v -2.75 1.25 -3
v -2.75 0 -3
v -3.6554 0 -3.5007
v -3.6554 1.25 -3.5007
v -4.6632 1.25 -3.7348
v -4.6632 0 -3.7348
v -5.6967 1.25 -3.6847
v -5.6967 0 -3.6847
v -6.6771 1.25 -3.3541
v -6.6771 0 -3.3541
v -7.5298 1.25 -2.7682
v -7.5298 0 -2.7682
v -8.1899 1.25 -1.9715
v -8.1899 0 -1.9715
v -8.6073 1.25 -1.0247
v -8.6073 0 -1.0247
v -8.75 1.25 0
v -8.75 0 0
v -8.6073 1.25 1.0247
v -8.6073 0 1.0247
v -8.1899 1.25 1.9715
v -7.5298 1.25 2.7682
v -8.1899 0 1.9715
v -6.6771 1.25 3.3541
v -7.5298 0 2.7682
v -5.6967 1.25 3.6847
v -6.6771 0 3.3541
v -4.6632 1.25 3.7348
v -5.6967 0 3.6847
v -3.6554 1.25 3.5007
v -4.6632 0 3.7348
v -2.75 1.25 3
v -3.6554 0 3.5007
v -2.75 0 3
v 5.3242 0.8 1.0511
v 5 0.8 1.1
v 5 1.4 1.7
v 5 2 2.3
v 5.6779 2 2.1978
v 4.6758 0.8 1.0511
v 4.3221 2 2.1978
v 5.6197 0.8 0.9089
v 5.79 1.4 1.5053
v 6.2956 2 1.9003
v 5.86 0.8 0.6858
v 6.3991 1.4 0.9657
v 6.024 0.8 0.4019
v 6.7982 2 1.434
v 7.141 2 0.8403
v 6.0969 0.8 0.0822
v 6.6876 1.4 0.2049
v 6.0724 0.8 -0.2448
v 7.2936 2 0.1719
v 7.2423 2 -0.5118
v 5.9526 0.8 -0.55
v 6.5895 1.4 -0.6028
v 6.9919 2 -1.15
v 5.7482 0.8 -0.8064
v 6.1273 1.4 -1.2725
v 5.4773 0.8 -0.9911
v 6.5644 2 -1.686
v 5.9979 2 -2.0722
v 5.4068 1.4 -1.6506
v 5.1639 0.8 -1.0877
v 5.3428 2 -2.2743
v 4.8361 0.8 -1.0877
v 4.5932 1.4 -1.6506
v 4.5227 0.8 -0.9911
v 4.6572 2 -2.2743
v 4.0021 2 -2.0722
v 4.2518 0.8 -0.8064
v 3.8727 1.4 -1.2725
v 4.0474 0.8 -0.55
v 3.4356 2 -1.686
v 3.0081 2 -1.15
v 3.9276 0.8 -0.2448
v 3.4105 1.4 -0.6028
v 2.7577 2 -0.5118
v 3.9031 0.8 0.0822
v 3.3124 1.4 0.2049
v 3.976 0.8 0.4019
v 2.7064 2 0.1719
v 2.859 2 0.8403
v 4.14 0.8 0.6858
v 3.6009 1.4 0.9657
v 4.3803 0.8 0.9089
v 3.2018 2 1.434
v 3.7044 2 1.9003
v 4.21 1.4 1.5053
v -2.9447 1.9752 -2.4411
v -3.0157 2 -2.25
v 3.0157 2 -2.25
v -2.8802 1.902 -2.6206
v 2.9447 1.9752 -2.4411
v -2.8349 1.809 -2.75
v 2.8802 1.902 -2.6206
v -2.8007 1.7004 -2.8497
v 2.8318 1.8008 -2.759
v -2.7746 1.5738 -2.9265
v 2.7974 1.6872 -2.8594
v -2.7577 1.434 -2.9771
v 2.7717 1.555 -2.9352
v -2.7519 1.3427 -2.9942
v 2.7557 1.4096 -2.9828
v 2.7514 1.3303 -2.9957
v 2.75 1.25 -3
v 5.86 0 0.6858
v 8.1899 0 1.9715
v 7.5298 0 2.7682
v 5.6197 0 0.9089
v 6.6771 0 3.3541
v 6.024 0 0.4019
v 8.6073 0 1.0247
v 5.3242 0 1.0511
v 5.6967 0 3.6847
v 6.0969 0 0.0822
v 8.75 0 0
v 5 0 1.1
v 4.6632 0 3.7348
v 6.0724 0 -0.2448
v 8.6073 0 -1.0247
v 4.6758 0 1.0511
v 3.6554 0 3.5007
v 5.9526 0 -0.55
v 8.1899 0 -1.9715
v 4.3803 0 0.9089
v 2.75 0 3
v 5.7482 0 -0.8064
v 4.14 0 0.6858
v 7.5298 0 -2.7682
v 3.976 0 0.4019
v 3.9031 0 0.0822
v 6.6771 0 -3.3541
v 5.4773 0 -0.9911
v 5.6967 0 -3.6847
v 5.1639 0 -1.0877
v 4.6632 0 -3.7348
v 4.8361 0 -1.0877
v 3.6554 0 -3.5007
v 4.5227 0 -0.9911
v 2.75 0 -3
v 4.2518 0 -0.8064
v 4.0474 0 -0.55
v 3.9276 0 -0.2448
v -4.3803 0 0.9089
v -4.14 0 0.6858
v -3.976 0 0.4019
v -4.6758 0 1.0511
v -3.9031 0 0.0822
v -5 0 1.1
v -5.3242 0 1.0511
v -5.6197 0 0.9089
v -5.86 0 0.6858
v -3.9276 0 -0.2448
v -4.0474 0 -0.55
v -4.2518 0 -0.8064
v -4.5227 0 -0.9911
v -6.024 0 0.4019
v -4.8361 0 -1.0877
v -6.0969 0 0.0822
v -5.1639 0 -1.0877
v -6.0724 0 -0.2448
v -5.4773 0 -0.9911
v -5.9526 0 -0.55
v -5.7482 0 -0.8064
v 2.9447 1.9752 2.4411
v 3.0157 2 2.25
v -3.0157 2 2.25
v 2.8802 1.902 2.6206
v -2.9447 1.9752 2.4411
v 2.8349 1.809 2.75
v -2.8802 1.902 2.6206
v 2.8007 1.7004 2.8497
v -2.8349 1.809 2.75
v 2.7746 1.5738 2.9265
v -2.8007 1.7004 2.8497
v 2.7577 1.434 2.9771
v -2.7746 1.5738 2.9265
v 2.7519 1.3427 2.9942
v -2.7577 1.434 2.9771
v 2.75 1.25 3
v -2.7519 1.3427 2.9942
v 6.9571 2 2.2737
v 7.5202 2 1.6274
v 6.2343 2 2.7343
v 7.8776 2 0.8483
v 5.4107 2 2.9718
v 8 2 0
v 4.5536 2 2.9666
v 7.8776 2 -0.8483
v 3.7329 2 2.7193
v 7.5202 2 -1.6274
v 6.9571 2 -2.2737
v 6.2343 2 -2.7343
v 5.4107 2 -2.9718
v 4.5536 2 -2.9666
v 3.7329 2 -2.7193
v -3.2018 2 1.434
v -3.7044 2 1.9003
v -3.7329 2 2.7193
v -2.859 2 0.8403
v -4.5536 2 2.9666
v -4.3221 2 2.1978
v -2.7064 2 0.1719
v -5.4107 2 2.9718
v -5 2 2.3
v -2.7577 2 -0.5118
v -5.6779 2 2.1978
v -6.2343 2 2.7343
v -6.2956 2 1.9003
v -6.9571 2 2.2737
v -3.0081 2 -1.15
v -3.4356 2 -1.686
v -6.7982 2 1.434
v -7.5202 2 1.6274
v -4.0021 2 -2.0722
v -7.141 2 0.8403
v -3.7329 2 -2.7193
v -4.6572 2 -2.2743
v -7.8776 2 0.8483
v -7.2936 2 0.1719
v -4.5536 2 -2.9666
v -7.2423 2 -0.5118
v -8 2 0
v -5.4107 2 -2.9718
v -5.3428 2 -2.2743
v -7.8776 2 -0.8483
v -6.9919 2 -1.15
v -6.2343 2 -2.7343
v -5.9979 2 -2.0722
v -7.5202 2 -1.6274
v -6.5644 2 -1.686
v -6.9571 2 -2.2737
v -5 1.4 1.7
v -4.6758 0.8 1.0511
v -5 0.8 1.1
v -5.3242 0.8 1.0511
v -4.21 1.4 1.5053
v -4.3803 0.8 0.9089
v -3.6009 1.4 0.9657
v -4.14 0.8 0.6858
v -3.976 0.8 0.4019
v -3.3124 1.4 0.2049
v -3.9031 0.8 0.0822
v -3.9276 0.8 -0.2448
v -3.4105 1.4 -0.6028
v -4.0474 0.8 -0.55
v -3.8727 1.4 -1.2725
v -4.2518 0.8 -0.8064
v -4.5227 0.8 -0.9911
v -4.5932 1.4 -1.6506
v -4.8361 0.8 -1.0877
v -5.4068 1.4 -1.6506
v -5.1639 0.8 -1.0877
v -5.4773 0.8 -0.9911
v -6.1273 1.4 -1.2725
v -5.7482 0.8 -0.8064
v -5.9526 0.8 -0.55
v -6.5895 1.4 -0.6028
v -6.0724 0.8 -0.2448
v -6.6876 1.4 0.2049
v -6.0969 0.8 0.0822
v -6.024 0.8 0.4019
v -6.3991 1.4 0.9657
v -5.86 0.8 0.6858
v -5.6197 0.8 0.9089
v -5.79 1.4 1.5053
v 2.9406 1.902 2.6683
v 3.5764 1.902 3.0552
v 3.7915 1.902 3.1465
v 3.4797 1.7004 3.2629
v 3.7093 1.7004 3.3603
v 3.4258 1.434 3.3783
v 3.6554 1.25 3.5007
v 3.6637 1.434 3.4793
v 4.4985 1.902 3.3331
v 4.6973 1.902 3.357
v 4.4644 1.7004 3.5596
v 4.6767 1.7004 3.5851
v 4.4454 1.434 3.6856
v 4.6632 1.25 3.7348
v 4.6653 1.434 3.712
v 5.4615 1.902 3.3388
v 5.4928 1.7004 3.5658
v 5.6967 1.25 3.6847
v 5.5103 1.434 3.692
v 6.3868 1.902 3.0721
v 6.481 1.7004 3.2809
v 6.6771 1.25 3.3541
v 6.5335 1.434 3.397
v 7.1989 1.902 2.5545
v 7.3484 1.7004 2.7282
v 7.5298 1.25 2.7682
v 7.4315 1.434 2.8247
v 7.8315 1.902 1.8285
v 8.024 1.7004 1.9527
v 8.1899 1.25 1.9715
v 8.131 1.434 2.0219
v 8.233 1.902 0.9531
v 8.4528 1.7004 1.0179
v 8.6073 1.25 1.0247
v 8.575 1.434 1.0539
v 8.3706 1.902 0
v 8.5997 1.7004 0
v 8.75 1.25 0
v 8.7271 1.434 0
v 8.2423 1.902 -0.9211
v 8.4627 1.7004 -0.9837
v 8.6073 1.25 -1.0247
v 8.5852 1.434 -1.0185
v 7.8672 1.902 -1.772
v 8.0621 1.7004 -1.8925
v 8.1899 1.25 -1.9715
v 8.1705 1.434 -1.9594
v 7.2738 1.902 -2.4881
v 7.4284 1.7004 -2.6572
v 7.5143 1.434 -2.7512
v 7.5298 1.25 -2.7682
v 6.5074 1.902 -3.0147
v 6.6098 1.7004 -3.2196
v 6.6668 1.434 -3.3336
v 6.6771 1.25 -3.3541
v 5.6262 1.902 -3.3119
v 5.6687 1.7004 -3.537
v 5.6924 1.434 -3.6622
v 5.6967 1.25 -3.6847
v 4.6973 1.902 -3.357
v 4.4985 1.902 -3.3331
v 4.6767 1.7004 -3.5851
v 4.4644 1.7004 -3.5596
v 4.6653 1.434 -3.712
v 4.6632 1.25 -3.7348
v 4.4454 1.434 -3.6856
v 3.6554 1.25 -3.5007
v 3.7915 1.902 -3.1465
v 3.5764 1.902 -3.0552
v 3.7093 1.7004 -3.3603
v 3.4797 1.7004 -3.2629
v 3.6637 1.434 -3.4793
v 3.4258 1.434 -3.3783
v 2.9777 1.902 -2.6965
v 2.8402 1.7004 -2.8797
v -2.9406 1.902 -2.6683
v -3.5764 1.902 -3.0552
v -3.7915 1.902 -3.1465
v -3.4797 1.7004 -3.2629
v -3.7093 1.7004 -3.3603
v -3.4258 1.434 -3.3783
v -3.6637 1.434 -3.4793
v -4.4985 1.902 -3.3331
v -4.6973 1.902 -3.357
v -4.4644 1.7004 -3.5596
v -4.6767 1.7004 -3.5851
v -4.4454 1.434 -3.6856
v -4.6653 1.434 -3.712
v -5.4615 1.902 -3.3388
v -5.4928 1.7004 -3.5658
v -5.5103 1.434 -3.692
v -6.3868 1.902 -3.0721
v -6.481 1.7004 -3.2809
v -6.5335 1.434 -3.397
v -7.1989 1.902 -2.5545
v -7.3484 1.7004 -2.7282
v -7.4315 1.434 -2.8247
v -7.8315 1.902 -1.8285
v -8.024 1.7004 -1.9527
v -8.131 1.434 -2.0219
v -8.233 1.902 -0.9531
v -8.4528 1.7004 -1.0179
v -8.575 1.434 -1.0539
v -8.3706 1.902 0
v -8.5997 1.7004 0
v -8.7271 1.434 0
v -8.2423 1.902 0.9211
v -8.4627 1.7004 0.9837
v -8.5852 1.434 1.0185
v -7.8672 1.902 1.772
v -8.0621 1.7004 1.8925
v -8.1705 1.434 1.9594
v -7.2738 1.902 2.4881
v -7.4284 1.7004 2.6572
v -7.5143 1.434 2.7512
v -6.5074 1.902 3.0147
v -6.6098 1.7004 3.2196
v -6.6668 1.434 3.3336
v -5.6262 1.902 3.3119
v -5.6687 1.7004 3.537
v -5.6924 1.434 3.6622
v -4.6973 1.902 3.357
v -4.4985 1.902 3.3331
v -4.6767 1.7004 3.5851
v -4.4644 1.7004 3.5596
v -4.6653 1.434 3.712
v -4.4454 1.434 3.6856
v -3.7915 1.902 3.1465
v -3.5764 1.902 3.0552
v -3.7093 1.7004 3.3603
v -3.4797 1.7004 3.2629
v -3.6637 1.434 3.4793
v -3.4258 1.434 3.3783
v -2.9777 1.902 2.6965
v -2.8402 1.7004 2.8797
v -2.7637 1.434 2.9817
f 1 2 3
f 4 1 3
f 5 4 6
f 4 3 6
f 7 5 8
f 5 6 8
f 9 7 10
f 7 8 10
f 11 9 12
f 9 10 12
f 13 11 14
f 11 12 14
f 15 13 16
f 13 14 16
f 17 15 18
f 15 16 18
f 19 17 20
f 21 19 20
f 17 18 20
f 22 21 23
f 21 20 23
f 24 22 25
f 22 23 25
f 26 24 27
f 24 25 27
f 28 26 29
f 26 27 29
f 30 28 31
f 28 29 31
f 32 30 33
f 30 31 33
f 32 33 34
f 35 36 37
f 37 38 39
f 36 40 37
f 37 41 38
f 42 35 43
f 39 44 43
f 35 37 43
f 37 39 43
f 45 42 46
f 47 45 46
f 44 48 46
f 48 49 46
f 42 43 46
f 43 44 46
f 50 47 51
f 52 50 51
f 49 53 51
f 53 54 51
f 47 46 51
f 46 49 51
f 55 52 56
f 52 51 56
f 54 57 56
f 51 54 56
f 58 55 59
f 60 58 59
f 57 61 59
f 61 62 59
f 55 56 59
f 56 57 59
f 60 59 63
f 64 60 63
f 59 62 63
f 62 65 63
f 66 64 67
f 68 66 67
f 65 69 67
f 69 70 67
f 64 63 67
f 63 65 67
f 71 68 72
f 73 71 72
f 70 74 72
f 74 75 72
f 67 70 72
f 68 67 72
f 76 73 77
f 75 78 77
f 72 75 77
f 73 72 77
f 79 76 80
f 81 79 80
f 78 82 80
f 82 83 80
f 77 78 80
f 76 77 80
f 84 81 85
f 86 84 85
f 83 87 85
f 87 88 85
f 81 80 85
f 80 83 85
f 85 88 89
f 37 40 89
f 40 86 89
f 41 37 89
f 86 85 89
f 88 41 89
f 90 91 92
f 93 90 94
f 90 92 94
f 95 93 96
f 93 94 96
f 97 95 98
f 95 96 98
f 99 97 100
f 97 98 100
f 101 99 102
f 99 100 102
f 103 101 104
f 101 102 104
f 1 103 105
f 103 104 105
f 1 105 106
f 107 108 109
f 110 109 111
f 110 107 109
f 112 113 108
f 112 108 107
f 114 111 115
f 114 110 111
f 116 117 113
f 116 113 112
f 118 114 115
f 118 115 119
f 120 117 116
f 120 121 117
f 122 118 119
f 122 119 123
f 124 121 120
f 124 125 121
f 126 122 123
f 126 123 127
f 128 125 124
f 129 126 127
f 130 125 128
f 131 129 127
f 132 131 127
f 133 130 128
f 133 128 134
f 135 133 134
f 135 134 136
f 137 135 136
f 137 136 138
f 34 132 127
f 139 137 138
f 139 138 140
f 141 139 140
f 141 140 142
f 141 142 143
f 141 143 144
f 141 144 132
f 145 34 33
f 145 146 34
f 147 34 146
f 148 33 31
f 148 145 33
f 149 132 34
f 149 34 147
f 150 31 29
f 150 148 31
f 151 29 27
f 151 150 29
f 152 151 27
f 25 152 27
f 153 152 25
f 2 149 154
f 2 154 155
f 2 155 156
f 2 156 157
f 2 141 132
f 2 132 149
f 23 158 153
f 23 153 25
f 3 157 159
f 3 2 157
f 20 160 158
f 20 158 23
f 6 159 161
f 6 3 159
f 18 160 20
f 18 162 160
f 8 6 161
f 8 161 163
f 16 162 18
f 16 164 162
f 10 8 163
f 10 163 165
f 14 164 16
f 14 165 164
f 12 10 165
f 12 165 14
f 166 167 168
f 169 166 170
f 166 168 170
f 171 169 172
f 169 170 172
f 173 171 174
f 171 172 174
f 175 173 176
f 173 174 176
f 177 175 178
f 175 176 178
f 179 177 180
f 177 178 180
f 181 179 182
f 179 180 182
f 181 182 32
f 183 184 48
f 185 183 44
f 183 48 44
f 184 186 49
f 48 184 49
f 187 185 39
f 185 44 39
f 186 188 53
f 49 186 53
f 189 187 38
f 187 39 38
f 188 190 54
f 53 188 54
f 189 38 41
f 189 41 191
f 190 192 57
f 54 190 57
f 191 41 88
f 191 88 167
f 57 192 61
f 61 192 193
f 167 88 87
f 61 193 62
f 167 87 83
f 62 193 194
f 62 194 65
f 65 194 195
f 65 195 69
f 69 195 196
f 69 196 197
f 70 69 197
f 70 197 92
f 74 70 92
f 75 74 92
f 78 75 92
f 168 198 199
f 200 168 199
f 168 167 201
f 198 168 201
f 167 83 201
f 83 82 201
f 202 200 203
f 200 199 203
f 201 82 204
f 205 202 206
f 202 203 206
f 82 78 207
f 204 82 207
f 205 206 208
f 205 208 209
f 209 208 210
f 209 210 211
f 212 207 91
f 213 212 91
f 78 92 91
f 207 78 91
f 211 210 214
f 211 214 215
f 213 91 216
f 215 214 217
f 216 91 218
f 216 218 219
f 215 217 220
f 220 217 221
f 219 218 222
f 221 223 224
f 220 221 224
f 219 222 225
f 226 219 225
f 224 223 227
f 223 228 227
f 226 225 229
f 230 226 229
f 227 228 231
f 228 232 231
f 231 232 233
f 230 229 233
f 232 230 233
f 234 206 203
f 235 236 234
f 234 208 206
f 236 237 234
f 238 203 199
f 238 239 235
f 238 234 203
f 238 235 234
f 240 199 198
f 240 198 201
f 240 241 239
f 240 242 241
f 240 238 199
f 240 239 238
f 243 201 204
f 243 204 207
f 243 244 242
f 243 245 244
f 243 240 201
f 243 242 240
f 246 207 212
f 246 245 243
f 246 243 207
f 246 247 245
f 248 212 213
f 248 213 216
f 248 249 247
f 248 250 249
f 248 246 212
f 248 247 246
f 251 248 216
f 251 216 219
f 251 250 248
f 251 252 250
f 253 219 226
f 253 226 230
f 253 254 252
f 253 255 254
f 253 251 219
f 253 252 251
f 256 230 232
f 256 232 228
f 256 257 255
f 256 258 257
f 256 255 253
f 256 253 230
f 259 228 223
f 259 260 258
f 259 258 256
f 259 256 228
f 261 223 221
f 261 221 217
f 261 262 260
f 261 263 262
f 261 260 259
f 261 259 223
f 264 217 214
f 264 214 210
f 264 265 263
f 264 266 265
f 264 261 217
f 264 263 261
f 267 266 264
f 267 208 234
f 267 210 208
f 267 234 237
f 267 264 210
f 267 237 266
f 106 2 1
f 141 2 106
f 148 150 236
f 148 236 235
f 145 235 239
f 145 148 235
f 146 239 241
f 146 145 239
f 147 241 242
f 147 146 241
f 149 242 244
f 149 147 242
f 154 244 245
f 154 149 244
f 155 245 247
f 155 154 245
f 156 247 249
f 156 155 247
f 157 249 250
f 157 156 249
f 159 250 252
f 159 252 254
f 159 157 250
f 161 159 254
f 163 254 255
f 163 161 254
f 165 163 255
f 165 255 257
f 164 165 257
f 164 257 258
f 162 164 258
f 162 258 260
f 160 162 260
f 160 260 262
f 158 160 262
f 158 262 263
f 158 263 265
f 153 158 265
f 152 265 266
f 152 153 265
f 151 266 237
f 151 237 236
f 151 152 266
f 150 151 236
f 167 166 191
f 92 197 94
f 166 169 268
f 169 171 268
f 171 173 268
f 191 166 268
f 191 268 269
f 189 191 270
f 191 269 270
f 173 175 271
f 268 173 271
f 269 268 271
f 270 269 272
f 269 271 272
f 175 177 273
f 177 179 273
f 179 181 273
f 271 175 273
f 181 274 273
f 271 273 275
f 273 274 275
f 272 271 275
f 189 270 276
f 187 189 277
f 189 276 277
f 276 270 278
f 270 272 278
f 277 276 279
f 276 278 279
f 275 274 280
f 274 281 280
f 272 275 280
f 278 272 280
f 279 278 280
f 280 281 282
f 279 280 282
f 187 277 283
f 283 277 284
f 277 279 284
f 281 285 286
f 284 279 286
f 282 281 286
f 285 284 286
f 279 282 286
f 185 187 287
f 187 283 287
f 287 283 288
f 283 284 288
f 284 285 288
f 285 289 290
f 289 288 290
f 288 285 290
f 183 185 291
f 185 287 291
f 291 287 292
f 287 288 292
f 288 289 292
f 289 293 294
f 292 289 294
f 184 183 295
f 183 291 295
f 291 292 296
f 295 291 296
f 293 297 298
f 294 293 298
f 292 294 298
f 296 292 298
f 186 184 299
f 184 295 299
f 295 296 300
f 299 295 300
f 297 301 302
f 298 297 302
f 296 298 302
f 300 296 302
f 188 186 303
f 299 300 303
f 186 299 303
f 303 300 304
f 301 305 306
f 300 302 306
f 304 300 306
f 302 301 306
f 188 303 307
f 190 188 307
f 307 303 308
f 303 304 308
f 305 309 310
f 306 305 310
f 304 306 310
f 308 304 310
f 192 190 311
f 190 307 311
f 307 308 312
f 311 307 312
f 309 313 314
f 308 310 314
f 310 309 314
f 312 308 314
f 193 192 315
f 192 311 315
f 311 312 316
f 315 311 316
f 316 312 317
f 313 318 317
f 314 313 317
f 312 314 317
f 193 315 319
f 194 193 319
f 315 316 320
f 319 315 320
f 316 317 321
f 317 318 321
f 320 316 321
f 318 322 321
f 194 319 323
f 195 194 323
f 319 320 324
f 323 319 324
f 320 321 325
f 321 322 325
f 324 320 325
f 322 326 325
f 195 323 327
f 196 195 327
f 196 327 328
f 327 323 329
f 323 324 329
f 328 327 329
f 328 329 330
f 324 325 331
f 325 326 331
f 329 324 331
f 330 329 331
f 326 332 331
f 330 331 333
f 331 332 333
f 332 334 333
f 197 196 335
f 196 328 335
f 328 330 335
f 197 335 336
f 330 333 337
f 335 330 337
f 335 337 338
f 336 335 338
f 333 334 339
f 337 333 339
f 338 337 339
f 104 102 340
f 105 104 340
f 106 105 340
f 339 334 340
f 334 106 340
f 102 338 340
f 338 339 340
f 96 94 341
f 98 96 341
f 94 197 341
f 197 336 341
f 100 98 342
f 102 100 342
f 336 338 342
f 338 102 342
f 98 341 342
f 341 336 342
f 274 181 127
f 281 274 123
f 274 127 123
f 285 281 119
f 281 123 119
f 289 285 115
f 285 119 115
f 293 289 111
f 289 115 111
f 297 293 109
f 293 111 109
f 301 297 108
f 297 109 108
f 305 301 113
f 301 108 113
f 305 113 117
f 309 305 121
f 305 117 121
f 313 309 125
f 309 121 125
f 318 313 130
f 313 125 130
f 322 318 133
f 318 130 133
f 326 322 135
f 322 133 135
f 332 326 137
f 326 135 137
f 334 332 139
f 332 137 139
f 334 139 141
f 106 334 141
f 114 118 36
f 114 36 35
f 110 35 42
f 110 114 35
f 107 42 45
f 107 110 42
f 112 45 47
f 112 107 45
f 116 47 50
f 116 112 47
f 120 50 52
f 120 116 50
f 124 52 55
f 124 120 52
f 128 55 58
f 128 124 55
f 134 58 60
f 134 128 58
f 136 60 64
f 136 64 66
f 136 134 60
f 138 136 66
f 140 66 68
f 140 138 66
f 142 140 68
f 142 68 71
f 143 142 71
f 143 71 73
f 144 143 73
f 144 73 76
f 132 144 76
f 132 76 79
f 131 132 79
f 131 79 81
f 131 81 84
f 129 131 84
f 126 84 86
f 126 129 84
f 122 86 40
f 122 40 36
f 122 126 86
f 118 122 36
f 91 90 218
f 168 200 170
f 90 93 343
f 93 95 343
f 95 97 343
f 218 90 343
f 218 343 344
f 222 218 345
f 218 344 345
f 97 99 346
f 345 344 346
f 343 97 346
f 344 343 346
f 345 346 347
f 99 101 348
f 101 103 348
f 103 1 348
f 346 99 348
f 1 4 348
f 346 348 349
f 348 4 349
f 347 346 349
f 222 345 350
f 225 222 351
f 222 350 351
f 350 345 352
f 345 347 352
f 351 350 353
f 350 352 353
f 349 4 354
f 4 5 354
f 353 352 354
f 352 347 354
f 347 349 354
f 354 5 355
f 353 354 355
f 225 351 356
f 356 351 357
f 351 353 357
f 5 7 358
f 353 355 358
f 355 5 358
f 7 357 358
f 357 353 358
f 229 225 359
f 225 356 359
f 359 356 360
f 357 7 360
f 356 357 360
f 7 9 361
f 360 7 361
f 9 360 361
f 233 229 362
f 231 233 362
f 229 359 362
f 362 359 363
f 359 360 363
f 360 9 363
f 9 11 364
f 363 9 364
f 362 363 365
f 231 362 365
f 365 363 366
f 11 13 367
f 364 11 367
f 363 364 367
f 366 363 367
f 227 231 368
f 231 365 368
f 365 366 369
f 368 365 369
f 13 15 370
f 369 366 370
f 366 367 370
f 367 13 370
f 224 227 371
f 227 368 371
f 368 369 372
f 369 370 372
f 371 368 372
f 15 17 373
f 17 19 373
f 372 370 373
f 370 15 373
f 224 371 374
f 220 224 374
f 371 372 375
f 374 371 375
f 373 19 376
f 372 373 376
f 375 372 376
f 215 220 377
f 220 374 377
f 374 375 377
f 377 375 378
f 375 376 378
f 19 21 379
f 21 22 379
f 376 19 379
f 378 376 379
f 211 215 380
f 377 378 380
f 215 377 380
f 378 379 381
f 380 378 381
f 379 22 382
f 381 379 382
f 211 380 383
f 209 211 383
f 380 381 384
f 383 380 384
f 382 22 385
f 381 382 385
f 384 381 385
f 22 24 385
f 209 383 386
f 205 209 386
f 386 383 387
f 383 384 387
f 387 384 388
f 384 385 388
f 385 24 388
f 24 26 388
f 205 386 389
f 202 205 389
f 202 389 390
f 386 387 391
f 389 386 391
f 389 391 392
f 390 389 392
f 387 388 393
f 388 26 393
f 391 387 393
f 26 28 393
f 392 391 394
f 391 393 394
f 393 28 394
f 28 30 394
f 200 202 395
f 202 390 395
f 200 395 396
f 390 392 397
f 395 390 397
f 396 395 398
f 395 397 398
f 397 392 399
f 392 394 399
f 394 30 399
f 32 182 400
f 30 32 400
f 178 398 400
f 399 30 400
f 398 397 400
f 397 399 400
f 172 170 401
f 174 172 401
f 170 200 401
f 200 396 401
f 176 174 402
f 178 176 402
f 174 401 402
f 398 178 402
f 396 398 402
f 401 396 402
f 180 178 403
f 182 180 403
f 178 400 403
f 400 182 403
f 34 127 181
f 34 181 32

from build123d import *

# Parameters (mm, degrees)
SKETCH1_R           = 1.1
BOSS_EXTRUDE1_DEPTH = 2
BOSS_EXTRUDE3_START = -2
SKETCH3_R           = 3.75
SKETCH3_R_2         = 1.1
BOSS_EXTRUDE3_DEPTH = 2
CHAMFER1_SIZE       = 1.2
FILLET1_R           = 0.75


with BuildPart() as part:
    # Sketch1 → Boss-Extrude1 (new body)
    with BuildSketch(Plane(origin=(0, 0, 0), x_dir=(1, 0, 0), z_dir=(0, 1, 0))):
        with BuildLine():
            Line((-5, 3), (5, 3))
            ThreePointArc((5, 3), (8, 0), (5, -3))
            Line((5, -3), (-5, -3))
            ThreePointArc((-5, -3), (-8, 0), (-5, 3))
        make_face()
        with Locations(Location((-5, 0, 0), (0, 0, 270))):
            Circle(SKETCH1_R, mode=Mode.SUBTRACT)
        with Locations(Location((5, 0, 0), (0, 0, 270))):
            Circle(SKETCH1_R, mode=Mode.SUBTRACT)
    extrude(amount=BOSS_EXTRUDE1_DEPTH)

    # Sketch3 → Boss-Extrude3 (add)
    # profile 1 of 2: a face of its own
    with BuildSketch(Plane(origin=(0, 2, 0), x_dir=(1, 0, 0), z_dir=(0, 1, 0)).offset(BOSS_EXTRUDE3_START)):
        with Locations((-5, 0)):
            Circle(SKETCH3_R)
        with Locations(Location((-5, 0, 0), (0, 0, 270))):
            Circle(SKETCH3_R_2, mode=Mode.SUBTRACT)
    # profile 2 of 2: a face of its own
    with BuildSketch(Plane(origin=(0, 2, 0), x_dir=(1, 0, 0), z_dir=(0, 1, 0)).offset(BOSS_EXTRUDE3_START)):
        with Locations((5, 0)):
            Circle(SKETCH3_R)
        with Locations(Location((5, 0, 0), (0, 0, 270))):
            Circle(SKETCH3_R_2, mode=Mode.SUBTRACT)
    extrude(amount=BOSS_EXTRUDE3_DEPTH)

    # Chamfer1
    chamfer1_edges = [part.edges().sort_by_distance(p)[0] for p in [
        (-5, 2, -1.1),
        (5, 2, -1.1),
    ]]
    chamfer(chamfer1_edges, length=CHAMFER1_SIZE)

    # Fillet1
    fillet1_edges = [part.edges().sort_by_distance(p)[0] for p in [
        (0, 2, 3),
        (-8.75, 2, 0),
        (0, 2, -3),
        (8.75, 2, 0),
    ]]
    fillet(fillet1_edges, radius=FILLET1_R)


solid = part.part
